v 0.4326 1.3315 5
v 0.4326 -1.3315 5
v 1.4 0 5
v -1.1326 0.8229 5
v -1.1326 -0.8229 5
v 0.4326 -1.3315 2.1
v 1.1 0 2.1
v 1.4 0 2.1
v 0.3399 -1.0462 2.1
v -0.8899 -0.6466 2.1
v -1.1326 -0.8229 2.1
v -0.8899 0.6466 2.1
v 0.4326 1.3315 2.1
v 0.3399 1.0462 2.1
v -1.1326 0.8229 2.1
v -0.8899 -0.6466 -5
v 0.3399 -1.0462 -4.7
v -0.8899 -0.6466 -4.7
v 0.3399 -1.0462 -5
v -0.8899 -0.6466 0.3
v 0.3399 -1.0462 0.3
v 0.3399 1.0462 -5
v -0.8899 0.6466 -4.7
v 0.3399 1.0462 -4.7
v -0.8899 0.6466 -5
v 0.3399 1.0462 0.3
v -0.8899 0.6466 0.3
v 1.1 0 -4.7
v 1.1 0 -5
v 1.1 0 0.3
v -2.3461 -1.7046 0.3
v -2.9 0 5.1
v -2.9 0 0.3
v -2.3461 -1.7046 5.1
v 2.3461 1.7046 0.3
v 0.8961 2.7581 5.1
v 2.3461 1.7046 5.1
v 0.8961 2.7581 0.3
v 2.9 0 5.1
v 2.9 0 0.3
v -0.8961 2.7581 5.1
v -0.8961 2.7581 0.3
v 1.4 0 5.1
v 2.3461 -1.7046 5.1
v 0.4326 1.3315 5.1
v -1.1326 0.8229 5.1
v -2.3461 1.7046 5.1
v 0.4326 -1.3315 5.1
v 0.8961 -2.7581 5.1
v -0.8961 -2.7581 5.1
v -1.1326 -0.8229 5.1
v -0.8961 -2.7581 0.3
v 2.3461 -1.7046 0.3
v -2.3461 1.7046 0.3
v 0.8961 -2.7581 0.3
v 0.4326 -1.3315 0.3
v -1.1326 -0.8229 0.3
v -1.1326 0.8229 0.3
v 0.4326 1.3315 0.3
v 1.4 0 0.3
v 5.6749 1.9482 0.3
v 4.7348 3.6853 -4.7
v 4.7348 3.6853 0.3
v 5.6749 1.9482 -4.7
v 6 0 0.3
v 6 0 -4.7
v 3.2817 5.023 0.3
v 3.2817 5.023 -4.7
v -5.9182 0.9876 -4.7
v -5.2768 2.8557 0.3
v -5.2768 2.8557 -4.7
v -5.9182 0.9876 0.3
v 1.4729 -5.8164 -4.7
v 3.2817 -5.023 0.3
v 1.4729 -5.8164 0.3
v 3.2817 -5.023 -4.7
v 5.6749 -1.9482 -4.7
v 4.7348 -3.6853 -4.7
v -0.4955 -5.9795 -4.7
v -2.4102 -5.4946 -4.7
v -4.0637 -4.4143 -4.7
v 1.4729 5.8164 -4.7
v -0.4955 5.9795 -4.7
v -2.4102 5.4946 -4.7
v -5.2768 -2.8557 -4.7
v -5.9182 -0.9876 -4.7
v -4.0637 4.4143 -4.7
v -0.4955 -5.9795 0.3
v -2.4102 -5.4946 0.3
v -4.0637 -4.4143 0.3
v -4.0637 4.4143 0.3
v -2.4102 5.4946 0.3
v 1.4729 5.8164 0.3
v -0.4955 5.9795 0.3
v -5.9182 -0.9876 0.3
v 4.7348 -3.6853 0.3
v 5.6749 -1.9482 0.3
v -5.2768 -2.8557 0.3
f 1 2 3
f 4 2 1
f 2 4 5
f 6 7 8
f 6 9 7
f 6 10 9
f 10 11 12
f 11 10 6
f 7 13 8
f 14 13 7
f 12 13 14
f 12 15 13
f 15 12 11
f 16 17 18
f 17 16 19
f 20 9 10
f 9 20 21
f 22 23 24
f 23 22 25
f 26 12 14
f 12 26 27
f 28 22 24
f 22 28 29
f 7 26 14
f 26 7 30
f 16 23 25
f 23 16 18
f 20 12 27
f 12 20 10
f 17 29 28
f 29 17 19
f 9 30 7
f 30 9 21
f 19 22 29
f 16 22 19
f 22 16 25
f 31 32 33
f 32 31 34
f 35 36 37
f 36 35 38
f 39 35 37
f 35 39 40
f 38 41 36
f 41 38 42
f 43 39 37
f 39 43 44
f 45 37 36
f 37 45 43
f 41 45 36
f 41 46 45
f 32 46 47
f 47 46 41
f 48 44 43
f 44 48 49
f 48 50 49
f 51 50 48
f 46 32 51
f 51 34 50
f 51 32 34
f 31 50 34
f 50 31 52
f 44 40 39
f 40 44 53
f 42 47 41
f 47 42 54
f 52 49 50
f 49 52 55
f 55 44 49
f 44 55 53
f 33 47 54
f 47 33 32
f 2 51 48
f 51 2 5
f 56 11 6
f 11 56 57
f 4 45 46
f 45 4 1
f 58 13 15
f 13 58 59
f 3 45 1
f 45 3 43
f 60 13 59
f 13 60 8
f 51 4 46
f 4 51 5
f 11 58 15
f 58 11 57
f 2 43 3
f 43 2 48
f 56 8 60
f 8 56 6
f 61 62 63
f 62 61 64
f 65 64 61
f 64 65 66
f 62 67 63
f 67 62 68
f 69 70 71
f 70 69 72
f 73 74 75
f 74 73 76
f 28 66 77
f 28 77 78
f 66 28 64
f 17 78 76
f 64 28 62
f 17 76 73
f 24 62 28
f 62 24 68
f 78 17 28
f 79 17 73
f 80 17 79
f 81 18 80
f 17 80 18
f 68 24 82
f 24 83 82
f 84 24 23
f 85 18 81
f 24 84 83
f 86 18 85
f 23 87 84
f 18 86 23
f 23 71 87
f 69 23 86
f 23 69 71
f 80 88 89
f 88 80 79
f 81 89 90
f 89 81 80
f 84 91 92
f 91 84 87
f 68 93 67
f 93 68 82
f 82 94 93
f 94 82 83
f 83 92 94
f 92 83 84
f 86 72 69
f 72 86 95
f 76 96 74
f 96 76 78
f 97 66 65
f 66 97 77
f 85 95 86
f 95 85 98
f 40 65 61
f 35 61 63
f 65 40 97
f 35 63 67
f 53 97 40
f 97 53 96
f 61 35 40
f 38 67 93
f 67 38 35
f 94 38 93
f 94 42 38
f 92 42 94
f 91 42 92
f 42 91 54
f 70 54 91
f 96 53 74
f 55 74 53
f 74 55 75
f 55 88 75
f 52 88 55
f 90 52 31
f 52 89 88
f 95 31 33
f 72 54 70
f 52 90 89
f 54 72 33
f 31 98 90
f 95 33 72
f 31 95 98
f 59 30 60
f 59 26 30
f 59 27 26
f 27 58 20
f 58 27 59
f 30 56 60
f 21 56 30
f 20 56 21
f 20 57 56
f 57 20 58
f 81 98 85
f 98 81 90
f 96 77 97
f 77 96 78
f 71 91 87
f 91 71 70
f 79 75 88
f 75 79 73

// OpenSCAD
// Parameters
shank_diameter_mm = 2.2; //[1.1:4.4:0.1]
length_mm = 10; //[5:20:0.5]
head_diameter_mm = 4.2; //[2.1:8.4:0.1]
head_height_mm = 1.7; //[0.85:3.4:0.05]
overlap_mm = 1.2; //[0.2:2:0.1]   // ensure 1–2mm overlap for solid connections
head_rounding_factor = 0.55; //[0.2:1:0.05]
washer_thickness_mm = 0.6; //[0.3:1.2:0.05]
washer_outer_diameter_mm = 5.2; //[3:10.4:0.1]
spacer_height_mm = 6; //[3:12:0.5]
spacer_wall_mm = 1.8; //[0.9:3.6:0.1]
buzzer_radius_mm = 6; //[3:12:0.5]
buzzer_height_mm = 5; //[2.5:10:0.5]

// Derived Z stack (all parts centered on Z, then positioned so faces overlap)
shank_h = length_mm - head_height_mm;

// Place head top at +length/2, shank bottom at -length/2
z_head =  length_mm/2 - head_height_mm/2;
z_shank = -length_mm/2 + shank_h/2;

// Washer sits directly under head, overlapping into head by overlap_mm
z_washer = (z_head - head_height_mm/2) - washer_thickness_mm/2 + overlap_mm;

// Spacer sits under washer, overlapping into washer by overlap_mm
z_spacer = (z_washer - washer_thickness_mm/2) - spacer_height_mm/2 + overlap_mm;

// Buzzer sits under spacer, overlapping into spacer by overlap_mm
z_buzzer = (z_spacer - spacer_height_mm/2) - buzzer_height_mm/2 + overlap_mm;

// Screw and Washer - connected geometry
module screw_and_washer() {
  color("DimGray")
  union() {
    // Shank (overlaps into head by overlap_mm)
    translate([0, 0, z_shank + overlap_mm/2])
      cylinder(h=shank_h + overlap_mm, r=shank_diameter_mm/2, center=true);

    // Pan Head (overlaps into shank by overlap_mm)
    translate([0, 0, z_head - overlap_mm/2])
      union() {
        cylinder(h=head_height_mm + overlap_mm, r=head_diameter_mm/2, center=true);
        translate([0, 0, head_height_mm/2 - (head_height_mm*head_rounding_factor)])
          sphere(r=(head_diameter_mm/2) - (head_height_mm*head_rounding_factor), center=true);
      }

    // Washer (touches/overlaps head underside by overlap_mm)
    translate([0, 0, z_washer])
      difference() {
        cylinder(h=washer_thickness_mm, r=washer_outer_diameter_mm/2, center=true);
        cylinder(h=washer_thickness_mm + overlap_mm, r=shank_diameter_mm/2 + overlap_mm/4, center=true);
      }
  }
}

// PCB Spacer - connected geometry
module pcb_spacer() {
  color("Silver")
  translate([0, 0, z_spacer])
    difference() {
      cylinder(h=spacer_height_mm, r=(shank_diameter_mm/2) + spacer_wall_mm, center=true);
      cylinder(h=spacer_height_mm + overlap_mm, r=shank_diameter_mm/2 + overlap_mm/4, center=true);
    }
}

// Buzzer - connected geometry
module buzzer() {
  color("Black")
  translate([0, 0, z_buzzer])
    cylinder(h=buzzer_height_mm, r=buzzer_radius_mm, center=true);
}

// Assembly (single solid union for connectivity)
module assembly() {
  union() {
    screw_and_washer();
    pcb_spacer();
    buzzer();
  }
}

assembly();
